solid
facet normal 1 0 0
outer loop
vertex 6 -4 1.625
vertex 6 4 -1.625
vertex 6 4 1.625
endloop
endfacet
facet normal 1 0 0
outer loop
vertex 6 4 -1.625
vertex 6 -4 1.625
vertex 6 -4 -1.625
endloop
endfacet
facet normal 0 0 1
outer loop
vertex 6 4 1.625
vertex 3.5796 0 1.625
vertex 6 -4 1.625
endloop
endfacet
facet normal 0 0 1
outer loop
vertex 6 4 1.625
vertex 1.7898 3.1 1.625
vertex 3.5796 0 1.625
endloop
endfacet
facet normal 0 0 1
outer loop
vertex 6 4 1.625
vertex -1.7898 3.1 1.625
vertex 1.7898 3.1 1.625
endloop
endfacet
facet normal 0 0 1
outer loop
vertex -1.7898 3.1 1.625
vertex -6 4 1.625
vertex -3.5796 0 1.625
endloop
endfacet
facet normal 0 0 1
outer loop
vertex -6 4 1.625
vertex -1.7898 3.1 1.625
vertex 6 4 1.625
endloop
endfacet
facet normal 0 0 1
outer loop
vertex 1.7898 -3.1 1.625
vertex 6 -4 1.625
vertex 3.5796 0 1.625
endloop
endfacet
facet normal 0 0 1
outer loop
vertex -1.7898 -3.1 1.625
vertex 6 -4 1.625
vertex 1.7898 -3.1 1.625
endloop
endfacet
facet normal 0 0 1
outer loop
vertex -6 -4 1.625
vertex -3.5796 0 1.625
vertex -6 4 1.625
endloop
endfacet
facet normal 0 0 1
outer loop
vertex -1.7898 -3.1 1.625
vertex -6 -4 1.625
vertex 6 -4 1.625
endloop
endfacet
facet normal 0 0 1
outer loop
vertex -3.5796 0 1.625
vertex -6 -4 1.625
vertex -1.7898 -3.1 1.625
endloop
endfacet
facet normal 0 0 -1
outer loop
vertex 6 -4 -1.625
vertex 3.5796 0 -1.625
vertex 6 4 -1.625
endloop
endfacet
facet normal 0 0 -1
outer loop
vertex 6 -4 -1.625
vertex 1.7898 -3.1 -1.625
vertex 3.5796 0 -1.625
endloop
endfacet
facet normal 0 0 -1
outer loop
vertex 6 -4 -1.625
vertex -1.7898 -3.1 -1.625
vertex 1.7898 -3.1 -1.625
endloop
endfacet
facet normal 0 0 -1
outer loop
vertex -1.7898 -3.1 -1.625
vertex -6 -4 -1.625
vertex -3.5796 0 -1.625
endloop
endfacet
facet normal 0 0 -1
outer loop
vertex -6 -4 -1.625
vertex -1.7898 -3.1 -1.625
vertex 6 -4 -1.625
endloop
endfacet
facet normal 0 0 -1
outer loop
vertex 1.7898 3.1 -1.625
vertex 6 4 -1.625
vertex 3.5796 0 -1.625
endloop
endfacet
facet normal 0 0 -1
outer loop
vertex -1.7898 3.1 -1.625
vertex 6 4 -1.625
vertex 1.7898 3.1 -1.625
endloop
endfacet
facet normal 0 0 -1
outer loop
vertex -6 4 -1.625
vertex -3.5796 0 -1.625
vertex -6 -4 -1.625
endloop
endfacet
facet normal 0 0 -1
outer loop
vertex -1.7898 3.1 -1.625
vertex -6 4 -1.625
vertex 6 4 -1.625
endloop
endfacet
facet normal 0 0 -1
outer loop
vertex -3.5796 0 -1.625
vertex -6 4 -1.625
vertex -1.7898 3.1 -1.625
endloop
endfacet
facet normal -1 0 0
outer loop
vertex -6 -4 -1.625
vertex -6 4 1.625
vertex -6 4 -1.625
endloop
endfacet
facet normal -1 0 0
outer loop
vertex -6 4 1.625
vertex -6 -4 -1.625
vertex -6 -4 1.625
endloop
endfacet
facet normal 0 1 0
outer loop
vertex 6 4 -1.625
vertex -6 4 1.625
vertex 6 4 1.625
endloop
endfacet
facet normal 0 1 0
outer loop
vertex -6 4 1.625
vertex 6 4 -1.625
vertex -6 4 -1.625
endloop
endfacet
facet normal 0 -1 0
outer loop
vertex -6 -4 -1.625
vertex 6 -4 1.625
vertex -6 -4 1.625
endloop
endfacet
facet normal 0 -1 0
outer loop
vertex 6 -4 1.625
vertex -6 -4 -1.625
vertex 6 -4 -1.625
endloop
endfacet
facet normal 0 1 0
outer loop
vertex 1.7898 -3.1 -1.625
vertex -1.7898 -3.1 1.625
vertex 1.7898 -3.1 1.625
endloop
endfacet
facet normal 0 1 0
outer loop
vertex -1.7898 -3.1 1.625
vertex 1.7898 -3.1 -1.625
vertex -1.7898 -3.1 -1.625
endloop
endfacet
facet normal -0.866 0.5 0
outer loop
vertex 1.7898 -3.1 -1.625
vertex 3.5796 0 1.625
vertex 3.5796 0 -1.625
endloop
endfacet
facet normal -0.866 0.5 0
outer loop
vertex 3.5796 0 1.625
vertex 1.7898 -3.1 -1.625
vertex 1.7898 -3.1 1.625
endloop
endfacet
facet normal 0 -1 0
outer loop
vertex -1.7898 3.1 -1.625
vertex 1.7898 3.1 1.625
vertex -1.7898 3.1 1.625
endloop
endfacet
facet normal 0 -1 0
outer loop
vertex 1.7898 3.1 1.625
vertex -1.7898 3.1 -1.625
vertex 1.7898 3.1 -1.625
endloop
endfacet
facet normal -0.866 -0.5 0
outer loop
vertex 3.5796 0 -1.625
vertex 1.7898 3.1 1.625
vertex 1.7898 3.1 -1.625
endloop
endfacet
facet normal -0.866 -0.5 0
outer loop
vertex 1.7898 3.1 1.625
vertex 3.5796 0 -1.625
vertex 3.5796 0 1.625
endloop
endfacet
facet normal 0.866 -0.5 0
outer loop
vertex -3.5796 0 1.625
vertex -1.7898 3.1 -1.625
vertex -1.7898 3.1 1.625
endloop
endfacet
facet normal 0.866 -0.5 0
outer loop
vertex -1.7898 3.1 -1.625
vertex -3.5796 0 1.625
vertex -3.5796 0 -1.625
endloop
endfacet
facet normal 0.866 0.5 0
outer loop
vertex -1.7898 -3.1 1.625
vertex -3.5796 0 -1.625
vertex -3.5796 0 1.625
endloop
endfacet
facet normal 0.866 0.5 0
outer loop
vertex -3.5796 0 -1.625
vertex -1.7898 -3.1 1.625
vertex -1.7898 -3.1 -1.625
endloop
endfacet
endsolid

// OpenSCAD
$fn=64;

screw_d = 4.0;
across_flats = 6.0;
thickness = 3.25;

clearance_d = 4.3;
hex_af = across_flats;
hex_r = hex_af / sqrt(3);

slot_width = 8.0;
slot_length = 12.0;
slot_height = thickness;

chamfer = 0.4;

module hex_prism(af, h){
    r = af / sqrt(3);
    cylinder(h=h, r=r, center=true, $fn=6);
}

module tslot_nut_body(){
    union(){
        cube([slot_length, slot_width, slot_height], center=true);
        translate([0, 0, slot_height/2 - chamfer/2])
            cube([slot_length-0.6, slot_width-0.6, chamfer], center=true);
        translate([0, 0, -slot_height/2 + chamfer/2])
            cube([slot_length-0.6, slot_width-0.6, chamfer], center=true);
    }
}

module tslot_nut(){
    difference(){
        tslot_nut_body();
        cylinder(h=thickness+1, d=clearance_d, center=true, $fn=64);
        translate([0,0,0.2])
            hex_prism(hex_af+0.2, thickness+1);
    }
}

tslot_nut();
